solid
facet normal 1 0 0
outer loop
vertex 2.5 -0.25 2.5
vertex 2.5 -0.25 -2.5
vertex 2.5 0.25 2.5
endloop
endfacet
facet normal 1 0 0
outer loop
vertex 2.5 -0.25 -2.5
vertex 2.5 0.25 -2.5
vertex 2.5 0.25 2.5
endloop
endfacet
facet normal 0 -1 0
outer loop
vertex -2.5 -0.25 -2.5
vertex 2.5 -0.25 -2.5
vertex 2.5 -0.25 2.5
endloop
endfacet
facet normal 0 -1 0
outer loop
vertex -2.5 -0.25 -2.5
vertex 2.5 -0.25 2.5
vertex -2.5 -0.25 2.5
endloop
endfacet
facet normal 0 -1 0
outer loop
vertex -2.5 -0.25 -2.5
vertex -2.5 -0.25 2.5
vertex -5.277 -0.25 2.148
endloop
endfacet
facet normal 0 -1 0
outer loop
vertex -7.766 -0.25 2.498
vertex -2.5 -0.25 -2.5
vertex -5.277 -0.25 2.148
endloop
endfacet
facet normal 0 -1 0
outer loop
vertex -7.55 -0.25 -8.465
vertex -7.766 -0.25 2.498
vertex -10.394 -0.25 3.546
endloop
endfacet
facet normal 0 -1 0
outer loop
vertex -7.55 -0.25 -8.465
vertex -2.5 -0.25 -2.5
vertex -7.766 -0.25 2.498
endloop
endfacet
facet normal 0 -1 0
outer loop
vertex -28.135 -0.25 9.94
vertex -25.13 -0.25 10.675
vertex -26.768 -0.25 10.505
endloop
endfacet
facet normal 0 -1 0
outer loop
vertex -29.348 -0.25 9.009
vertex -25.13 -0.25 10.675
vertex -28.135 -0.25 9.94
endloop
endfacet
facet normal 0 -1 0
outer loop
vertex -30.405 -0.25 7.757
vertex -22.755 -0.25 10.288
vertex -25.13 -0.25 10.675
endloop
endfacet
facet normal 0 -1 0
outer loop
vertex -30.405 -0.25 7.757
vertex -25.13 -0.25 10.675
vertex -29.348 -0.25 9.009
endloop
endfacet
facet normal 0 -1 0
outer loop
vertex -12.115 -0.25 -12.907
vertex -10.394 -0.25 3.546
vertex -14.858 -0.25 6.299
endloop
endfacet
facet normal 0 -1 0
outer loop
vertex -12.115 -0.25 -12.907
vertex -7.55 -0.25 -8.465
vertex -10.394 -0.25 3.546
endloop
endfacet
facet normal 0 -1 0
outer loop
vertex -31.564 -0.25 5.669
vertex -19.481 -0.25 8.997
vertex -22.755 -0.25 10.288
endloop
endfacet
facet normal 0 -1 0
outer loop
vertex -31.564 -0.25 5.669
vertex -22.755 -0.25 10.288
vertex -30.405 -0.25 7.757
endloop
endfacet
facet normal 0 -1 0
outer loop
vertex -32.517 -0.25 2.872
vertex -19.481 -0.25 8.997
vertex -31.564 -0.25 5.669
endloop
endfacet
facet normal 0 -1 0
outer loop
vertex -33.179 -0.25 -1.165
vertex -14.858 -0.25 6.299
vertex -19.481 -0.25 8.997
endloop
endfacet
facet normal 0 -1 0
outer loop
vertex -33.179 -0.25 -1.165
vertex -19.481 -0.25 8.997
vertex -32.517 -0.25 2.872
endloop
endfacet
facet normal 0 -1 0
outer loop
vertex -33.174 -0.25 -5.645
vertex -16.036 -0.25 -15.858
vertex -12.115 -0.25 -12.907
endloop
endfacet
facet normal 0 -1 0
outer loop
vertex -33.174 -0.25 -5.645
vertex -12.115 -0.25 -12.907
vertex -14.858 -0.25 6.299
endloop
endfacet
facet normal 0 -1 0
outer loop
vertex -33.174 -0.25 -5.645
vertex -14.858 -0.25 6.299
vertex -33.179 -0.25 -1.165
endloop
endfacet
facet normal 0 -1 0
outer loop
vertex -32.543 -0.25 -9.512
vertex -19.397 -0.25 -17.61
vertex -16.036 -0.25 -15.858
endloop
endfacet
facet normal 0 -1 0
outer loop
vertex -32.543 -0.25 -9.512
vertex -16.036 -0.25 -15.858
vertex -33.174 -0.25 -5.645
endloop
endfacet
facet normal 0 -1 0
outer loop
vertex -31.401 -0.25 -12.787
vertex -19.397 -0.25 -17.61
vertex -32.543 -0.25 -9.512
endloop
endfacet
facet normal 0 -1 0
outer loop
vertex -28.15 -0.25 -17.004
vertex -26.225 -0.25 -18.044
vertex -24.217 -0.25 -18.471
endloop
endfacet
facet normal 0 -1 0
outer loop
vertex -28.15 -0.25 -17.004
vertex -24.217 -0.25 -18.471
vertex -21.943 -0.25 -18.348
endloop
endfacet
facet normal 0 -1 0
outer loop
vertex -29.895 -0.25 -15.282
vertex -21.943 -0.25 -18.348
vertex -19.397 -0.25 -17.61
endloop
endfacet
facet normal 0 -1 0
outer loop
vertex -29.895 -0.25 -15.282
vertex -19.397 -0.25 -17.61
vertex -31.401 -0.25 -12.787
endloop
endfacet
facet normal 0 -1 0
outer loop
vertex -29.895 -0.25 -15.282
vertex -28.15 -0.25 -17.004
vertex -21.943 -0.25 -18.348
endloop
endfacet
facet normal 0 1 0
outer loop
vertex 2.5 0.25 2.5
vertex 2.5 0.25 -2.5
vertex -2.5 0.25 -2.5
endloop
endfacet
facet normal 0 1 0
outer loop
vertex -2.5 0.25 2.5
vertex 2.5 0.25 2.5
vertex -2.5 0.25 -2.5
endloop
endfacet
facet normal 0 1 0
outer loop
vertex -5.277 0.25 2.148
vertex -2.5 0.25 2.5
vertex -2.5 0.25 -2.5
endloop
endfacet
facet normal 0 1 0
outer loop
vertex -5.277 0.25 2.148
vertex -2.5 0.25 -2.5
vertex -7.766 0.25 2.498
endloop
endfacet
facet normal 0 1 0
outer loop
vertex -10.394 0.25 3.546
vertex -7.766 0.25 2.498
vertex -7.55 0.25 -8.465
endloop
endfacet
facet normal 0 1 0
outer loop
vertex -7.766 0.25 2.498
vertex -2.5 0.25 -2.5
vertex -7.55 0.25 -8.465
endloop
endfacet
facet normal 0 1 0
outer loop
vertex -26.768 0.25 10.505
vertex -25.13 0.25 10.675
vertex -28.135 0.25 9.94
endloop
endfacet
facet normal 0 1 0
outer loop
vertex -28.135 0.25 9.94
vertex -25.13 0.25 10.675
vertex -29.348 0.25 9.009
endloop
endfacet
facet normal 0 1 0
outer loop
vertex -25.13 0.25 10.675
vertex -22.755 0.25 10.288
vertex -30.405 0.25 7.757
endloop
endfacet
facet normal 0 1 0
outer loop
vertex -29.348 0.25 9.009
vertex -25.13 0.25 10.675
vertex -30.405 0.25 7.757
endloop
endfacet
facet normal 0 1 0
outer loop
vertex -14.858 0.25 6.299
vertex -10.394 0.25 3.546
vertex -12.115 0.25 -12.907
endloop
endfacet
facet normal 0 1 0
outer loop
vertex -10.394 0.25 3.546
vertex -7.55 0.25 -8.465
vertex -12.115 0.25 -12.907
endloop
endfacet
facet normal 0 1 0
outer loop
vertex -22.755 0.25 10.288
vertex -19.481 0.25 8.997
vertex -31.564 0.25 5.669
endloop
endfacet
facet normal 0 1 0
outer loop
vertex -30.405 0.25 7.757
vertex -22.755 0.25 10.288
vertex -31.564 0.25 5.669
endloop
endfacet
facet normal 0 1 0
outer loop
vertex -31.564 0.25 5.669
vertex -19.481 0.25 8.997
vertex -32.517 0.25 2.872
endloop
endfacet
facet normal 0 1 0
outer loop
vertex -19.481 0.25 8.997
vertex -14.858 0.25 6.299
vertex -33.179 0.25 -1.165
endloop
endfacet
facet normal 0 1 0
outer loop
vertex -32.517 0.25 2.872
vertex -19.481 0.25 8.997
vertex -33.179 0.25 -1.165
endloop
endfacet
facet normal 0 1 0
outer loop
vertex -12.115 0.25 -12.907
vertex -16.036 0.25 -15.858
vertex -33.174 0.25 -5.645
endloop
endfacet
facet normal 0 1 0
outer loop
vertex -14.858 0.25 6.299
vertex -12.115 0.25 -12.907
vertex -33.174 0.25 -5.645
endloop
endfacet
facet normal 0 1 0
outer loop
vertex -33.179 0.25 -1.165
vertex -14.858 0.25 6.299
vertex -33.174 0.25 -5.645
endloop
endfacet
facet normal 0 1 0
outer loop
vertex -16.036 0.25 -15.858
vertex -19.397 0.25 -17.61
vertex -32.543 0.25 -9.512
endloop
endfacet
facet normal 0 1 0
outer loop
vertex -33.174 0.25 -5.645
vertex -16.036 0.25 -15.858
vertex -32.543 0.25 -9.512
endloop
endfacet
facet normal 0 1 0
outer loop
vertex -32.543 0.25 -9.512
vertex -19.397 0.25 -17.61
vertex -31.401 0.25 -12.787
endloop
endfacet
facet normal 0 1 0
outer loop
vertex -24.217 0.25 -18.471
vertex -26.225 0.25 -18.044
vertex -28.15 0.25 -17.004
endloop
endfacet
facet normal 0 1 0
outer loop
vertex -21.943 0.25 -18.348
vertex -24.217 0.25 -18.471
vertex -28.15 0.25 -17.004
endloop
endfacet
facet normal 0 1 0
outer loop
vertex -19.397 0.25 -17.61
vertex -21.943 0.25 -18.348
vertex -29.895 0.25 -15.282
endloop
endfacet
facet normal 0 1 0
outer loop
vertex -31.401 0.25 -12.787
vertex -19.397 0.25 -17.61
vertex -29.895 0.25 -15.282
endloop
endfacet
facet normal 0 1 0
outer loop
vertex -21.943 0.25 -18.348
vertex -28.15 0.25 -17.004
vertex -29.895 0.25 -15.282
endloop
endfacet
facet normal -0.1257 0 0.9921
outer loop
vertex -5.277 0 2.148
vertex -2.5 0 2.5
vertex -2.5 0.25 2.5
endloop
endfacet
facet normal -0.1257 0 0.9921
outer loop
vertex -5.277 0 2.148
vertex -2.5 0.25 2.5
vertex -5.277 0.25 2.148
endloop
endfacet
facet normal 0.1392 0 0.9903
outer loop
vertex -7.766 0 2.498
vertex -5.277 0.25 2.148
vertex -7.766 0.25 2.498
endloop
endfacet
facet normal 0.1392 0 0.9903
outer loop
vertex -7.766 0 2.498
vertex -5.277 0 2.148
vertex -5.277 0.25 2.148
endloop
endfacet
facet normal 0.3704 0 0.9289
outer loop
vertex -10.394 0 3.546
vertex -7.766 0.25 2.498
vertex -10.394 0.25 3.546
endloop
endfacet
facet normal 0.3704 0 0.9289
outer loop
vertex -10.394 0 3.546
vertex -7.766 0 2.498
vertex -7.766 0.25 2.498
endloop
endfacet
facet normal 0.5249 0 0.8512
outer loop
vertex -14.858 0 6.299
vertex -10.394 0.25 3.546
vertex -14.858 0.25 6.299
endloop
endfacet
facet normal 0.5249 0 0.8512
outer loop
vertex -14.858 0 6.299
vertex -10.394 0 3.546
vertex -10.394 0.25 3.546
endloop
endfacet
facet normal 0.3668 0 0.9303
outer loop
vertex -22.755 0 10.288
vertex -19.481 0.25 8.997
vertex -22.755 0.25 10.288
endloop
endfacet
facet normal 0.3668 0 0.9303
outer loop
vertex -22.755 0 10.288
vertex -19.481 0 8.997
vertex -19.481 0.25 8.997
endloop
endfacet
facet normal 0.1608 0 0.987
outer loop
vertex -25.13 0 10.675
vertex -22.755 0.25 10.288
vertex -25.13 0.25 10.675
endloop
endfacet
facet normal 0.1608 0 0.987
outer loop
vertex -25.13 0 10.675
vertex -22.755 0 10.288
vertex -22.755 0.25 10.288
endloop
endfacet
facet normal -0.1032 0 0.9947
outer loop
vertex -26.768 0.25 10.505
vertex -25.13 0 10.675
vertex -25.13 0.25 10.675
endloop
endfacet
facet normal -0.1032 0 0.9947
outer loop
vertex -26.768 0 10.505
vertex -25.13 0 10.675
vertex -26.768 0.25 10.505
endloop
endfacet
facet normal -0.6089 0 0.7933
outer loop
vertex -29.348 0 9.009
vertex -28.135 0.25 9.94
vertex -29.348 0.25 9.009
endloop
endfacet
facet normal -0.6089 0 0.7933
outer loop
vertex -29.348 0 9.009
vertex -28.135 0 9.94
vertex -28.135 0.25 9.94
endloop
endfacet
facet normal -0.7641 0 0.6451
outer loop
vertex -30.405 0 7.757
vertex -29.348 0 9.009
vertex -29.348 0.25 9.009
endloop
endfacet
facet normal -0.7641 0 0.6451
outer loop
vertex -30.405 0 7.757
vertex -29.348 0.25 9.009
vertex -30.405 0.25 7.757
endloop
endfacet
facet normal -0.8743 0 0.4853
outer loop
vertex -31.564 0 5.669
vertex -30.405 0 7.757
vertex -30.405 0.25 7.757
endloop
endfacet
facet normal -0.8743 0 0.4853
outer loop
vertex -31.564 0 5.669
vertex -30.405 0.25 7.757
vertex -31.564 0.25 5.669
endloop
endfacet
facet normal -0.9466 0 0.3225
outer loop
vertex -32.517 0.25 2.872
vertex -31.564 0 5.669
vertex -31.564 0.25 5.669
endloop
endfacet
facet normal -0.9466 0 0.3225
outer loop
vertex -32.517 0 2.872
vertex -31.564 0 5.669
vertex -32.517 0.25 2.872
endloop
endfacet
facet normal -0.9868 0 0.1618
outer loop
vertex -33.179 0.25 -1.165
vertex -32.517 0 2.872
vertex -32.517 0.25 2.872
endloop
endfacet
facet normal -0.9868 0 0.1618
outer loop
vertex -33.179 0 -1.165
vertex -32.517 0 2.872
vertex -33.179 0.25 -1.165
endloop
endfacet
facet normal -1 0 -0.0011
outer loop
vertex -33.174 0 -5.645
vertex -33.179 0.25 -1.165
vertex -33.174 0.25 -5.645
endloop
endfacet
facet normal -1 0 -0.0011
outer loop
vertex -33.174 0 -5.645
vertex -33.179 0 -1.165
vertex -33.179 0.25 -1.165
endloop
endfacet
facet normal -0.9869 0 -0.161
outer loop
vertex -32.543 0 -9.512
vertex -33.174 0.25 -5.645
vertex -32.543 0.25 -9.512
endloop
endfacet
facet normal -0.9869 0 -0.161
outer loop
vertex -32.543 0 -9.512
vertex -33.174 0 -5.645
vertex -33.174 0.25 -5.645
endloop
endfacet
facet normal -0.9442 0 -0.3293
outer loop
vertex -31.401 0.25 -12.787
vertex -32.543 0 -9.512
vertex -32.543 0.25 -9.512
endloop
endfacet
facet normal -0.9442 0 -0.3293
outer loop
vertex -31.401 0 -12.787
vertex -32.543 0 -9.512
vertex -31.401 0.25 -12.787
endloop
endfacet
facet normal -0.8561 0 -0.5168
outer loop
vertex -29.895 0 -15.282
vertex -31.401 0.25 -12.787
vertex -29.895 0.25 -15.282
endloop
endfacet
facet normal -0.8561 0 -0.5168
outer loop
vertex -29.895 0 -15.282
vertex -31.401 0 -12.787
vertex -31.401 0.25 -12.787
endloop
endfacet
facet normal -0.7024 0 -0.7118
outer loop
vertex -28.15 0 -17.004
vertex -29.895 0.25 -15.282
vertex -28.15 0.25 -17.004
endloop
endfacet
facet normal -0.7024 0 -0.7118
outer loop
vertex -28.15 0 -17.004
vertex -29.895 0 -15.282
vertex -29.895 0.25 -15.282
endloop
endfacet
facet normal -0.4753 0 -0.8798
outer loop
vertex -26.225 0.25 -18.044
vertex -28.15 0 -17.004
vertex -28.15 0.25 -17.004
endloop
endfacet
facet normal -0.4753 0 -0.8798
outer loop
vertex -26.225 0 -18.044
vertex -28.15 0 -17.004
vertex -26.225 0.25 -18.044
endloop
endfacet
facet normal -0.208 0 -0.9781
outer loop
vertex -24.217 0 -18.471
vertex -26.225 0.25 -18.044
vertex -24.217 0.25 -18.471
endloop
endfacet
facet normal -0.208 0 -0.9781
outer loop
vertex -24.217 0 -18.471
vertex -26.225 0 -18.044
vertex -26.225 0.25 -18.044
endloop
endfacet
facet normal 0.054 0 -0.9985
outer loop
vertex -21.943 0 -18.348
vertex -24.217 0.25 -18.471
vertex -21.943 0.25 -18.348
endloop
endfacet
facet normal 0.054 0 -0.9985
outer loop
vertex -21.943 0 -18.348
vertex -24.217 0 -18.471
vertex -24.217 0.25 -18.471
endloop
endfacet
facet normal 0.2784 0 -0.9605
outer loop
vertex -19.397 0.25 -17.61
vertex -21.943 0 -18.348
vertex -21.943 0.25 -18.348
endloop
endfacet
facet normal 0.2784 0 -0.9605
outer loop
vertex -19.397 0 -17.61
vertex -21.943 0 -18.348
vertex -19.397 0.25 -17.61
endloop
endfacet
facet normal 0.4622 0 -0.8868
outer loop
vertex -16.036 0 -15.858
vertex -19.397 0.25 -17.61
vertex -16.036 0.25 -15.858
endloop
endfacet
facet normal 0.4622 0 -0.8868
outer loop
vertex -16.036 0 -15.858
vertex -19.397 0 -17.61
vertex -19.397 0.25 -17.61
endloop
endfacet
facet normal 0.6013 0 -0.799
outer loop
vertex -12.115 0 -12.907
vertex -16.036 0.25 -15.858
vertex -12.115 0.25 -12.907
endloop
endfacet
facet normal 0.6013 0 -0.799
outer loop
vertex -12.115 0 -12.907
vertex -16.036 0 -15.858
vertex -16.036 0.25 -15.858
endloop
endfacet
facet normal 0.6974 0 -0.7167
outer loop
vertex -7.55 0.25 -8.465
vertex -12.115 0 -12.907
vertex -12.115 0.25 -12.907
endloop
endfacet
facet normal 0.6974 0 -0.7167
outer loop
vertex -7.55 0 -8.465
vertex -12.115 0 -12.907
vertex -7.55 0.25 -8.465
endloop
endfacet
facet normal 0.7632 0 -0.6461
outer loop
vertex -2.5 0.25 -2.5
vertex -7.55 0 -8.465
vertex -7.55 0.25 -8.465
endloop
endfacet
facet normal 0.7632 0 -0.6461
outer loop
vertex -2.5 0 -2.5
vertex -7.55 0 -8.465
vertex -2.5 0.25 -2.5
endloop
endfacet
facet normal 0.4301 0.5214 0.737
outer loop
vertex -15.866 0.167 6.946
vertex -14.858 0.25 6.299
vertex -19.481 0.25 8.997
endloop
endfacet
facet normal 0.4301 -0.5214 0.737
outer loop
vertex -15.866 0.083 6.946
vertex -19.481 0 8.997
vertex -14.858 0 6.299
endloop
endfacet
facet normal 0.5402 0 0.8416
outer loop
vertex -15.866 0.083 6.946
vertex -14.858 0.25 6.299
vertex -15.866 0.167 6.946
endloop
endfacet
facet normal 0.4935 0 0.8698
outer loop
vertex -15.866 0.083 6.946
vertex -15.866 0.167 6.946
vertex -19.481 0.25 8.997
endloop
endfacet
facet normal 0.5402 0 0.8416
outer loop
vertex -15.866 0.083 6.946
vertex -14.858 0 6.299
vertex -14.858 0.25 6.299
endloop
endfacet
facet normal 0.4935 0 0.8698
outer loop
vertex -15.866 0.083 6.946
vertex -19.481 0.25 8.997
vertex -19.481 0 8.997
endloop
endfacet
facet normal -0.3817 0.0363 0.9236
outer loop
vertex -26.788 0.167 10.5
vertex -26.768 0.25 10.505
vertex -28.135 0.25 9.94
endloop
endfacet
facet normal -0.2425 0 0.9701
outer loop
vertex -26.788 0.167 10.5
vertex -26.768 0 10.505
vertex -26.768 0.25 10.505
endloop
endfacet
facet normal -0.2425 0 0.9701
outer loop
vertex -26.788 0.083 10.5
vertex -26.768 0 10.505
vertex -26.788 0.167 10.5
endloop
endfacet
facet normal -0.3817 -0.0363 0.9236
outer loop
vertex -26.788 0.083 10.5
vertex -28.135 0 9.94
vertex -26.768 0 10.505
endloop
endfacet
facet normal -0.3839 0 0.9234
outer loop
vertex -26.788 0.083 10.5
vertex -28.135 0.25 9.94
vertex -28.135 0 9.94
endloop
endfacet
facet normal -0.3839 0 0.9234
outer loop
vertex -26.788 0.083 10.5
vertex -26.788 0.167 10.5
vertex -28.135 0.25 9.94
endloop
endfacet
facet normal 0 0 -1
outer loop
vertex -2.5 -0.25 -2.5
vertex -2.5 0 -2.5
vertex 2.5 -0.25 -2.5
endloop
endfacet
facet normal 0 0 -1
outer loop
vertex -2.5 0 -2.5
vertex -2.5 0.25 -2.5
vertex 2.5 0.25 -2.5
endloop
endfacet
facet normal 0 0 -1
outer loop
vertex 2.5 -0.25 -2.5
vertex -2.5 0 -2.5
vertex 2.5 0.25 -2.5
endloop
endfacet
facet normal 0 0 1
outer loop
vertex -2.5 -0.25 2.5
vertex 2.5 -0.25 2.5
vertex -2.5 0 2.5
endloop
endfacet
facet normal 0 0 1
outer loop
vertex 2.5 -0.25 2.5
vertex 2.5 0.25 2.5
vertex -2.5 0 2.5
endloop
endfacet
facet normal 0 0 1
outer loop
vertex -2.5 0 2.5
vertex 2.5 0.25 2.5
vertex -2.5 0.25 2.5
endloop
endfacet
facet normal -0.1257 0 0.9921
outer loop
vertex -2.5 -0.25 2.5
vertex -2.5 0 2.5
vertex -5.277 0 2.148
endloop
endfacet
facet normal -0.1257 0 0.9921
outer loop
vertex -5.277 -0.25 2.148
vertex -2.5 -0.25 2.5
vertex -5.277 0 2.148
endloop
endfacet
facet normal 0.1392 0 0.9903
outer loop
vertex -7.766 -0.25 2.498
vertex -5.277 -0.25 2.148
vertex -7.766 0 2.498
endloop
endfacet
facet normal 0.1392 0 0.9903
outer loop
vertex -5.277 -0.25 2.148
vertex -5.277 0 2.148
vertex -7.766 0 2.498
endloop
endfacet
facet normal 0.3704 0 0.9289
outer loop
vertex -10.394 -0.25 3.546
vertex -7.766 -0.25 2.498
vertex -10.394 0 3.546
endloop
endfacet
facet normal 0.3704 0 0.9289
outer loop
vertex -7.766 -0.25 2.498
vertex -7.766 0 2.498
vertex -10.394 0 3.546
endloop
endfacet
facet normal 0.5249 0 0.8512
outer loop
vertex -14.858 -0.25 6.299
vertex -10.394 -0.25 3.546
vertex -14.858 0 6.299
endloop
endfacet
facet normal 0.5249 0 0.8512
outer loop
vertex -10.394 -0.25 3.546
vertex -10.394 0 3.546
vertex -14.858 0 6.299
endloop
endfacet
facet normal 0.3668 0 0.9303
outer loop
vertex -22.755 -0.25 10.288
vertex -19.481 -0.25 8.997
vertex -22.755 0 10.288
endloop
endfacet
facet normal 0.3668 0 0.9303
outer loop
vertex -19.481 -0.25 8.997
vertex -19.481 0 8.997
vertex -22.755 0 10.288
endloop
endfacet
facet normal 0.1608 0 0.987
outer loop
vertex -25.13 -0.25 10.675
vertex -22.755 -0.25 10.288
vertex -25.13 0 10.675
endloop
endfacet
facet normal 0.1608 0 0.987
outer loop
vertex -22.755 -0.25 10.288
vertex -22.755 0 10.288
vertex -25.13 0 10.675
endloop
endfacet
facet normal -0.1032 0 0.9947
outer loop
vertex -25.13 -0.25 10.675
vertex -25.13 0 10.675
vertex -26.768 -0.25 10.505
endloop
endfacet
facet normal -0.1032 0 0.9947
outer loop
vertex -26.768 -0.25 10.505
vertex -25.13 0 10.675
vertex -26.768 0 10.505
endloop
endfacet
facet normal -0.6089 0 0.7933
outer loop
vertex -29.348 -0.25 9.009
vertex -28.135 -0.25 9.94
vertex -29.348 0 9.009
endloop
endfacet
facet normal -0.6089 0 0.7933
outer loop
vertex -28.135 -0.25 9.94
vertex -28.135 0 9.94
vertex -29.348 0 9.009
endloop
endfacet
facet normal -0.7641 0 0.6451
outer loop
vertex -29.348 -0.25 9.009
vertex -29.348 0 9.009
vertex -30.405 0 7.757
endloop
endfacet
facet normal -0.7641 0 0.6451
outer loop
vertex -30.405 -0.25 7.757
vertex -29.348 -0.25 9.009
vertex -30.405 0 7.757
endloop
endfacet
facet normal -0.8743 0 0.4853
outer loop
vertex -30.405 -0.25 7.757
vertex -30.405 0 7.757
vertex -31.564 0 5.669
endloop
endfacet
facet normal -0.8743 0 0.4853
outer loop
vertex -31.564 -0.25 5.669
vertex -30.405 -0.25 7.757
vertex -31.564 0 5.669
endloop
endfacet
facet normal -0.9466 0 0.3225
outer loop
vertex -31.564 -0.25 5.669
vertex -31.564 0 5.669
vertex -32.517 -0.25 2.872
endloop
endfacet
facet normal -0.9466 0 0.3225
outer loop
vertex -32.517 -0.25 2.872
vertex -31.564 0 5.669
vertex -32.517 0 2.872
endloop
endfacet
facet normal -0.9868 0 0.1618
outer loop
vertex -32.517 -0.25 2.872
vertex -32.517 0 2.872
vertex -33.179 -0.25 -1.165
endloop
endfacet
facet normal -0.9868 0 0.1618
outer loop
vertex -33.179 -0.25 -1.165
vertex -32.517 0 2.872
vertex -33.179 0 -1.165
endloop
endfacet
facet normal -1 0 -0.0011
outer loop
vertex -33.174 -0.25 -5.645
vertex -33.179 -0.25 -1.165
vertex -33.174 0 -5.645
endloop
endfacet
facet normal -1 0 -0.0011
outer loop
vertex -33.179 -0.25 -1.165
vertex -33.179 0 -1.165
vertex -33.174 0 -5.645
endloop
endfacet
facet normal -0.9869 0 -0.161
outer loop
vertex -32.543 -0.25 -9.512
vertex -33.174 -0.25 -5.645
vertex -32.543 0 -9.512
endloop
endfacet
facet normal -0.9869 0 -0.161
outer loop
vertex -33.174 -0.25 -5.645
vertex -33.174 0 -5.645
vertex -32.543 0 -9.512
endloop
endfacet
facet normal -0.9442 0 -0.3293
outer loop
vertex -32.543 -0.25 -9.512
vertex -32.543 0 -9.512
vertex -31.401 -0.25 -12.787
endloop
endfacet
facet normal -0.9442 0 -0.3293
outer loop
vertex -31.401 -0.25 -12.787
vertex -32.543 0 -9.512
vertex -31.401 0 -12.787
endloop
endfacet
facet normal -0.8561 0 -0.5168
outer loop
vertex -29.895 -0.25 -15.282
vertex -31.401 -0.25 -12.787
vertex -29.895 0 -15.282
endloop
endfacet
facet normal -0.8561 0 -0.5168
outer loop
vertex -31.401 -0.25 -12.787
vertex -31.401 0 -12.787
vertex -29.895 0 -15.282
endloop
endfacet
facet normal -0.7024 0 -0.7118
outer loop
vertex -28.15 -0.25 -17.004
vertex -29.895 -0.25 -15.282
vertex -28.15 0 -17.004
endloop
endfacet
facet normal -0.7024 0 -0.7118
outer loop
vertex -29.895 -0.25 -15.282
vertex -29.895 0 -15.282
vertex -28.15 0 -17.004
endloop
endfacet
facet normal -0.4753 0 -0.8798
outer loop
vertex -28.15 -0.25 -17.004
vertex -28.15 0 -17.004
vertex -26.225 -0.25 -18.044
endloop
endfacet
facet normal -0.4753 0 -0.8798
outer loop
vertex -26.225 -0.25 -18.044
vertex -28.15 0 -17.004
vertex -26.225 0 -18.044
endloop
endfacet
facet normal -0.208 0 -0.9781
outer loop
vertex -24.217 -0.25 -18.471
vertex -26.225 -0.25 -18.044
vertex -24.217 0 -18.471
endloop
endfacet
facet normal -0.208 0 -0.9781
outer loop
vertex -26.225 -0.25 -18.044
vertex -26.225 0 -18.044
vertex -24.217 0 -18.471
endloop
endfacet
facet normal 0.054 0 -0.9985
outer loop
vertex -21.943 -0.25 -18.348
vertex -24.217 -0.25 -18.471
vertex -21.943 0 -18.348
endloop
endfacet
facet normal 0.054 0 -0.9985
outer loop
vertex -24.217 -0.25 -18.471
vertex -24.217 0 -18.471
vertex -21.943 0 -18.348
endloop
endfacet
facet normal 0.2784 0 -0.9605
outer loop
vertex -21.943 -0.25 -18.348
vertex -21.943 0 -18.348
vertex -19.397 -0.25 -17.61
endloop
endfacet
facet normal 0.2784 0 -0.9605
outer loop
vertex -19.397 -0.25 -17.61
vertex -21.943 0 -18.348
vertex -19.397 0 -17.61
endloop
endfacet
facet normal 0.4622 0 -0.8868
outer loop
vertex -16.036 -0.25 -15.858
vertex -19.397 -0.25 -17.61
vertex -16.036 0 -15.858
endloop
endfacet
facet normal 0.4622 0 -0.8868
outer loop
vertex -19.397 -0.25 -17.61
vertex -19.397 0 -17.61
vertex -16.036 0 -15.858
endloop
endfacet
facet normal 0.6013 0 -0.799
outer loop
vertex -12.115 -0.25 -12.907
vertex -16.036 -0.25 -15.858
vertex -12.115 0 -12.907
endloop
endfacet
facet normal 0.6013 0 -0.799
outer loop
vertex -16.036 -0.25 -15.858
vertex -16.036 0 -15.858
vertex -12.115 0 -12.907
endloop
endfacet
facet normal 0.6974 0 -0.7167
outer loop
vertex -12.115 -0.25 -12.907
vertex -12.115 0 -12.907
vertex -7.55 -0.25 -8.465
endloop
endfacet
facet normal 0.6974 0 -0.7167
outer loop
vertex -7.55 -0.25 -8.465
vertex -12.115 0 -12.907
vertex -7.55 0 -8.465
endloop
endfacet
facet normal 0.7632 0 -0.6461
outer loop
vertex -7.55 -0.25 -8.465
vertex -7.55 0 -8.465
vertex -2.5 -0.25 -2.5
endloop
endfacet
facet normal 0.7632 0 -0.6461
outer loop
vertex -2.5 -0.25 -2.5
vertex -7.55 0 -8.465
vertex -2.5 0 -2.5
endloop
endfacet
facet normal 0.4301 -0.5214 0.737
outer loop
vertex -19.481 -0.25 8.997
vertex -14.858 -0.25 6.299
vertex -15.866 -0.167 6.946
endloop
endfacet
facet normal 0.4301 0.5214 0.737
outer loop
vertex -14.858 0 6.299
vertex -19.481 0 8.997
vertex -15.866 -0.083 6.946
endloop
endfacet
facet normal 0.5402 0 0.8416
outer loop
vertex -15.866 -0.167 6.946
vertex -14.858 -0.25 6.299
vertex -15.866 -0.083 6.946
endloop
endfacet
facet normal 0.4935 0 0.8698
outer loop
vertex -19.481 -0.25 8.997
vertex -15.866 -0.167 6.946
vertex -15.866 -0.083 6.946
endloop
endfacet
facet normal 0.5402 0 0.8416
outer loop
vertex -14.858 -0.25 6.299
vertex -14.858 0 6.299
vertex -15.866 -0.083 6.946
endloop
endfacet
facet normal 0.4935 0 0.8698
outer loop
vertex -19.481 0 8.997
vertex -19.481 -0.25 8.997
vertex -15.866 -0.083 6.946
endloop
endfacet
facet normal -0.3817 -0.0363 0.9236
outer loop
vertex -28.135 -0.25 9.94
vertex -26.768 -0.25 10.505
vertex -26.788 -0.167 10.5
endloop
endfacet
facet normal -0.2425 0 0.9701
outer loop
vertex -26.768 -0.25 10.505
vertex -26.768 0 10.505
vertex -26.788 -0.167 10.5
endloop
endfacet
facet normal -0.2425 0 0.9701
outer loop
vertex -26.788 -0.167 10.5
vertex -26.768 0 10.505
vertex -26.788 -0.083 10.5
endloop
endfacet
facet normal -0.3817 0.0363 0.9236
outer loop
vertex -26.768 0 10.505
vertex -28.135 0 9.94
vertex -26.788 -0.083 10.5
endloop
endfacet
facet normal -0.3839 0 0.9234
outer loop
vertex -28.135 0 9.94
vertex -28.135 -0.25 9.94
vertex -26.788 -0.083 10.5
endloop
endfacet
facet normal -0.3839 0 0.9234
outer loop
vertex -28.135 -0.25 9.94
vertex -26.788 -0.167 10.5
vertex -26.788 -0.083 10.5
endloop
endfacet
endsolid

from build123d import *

# Parameters (mm, degrees)
BOSS_EXTRUDE2_DEPTH = 0.25


with BuildPart() as part:
    # Sketch1 → Boss-Extrude2 (new, symmetric)
    with BuildSketch(Plane(origin=(0, 0, 0), x_dir=(1, 0, 0), z_dir=(0, 1, 0))):
        with BuildLine():
            Line((-2.5, 2.5), (2.5, 2.5))
            Line((2.5, 2.5), (2.5, -2.5))
            Line((2.5, -2.5), (-2.5, -2.5))
            add(Edge.make_bspline(
                [(-2.5, -2.5), (-7.954517828, -1.104215092), (-14.088083086, -6.501740899), (-40.631286552, -19.870816294), (-34.680003686, 43.65787791), (-2.5, 2.5)],
                knots=[0, 0, 0, 0, 0.200882218, 0.359947113, 1, 1, 1, 1], degree=3))
        make_face()
    extrude(amount=BOSS_EXTRUDE2_DEPTH, both=True)


solid = part.part
